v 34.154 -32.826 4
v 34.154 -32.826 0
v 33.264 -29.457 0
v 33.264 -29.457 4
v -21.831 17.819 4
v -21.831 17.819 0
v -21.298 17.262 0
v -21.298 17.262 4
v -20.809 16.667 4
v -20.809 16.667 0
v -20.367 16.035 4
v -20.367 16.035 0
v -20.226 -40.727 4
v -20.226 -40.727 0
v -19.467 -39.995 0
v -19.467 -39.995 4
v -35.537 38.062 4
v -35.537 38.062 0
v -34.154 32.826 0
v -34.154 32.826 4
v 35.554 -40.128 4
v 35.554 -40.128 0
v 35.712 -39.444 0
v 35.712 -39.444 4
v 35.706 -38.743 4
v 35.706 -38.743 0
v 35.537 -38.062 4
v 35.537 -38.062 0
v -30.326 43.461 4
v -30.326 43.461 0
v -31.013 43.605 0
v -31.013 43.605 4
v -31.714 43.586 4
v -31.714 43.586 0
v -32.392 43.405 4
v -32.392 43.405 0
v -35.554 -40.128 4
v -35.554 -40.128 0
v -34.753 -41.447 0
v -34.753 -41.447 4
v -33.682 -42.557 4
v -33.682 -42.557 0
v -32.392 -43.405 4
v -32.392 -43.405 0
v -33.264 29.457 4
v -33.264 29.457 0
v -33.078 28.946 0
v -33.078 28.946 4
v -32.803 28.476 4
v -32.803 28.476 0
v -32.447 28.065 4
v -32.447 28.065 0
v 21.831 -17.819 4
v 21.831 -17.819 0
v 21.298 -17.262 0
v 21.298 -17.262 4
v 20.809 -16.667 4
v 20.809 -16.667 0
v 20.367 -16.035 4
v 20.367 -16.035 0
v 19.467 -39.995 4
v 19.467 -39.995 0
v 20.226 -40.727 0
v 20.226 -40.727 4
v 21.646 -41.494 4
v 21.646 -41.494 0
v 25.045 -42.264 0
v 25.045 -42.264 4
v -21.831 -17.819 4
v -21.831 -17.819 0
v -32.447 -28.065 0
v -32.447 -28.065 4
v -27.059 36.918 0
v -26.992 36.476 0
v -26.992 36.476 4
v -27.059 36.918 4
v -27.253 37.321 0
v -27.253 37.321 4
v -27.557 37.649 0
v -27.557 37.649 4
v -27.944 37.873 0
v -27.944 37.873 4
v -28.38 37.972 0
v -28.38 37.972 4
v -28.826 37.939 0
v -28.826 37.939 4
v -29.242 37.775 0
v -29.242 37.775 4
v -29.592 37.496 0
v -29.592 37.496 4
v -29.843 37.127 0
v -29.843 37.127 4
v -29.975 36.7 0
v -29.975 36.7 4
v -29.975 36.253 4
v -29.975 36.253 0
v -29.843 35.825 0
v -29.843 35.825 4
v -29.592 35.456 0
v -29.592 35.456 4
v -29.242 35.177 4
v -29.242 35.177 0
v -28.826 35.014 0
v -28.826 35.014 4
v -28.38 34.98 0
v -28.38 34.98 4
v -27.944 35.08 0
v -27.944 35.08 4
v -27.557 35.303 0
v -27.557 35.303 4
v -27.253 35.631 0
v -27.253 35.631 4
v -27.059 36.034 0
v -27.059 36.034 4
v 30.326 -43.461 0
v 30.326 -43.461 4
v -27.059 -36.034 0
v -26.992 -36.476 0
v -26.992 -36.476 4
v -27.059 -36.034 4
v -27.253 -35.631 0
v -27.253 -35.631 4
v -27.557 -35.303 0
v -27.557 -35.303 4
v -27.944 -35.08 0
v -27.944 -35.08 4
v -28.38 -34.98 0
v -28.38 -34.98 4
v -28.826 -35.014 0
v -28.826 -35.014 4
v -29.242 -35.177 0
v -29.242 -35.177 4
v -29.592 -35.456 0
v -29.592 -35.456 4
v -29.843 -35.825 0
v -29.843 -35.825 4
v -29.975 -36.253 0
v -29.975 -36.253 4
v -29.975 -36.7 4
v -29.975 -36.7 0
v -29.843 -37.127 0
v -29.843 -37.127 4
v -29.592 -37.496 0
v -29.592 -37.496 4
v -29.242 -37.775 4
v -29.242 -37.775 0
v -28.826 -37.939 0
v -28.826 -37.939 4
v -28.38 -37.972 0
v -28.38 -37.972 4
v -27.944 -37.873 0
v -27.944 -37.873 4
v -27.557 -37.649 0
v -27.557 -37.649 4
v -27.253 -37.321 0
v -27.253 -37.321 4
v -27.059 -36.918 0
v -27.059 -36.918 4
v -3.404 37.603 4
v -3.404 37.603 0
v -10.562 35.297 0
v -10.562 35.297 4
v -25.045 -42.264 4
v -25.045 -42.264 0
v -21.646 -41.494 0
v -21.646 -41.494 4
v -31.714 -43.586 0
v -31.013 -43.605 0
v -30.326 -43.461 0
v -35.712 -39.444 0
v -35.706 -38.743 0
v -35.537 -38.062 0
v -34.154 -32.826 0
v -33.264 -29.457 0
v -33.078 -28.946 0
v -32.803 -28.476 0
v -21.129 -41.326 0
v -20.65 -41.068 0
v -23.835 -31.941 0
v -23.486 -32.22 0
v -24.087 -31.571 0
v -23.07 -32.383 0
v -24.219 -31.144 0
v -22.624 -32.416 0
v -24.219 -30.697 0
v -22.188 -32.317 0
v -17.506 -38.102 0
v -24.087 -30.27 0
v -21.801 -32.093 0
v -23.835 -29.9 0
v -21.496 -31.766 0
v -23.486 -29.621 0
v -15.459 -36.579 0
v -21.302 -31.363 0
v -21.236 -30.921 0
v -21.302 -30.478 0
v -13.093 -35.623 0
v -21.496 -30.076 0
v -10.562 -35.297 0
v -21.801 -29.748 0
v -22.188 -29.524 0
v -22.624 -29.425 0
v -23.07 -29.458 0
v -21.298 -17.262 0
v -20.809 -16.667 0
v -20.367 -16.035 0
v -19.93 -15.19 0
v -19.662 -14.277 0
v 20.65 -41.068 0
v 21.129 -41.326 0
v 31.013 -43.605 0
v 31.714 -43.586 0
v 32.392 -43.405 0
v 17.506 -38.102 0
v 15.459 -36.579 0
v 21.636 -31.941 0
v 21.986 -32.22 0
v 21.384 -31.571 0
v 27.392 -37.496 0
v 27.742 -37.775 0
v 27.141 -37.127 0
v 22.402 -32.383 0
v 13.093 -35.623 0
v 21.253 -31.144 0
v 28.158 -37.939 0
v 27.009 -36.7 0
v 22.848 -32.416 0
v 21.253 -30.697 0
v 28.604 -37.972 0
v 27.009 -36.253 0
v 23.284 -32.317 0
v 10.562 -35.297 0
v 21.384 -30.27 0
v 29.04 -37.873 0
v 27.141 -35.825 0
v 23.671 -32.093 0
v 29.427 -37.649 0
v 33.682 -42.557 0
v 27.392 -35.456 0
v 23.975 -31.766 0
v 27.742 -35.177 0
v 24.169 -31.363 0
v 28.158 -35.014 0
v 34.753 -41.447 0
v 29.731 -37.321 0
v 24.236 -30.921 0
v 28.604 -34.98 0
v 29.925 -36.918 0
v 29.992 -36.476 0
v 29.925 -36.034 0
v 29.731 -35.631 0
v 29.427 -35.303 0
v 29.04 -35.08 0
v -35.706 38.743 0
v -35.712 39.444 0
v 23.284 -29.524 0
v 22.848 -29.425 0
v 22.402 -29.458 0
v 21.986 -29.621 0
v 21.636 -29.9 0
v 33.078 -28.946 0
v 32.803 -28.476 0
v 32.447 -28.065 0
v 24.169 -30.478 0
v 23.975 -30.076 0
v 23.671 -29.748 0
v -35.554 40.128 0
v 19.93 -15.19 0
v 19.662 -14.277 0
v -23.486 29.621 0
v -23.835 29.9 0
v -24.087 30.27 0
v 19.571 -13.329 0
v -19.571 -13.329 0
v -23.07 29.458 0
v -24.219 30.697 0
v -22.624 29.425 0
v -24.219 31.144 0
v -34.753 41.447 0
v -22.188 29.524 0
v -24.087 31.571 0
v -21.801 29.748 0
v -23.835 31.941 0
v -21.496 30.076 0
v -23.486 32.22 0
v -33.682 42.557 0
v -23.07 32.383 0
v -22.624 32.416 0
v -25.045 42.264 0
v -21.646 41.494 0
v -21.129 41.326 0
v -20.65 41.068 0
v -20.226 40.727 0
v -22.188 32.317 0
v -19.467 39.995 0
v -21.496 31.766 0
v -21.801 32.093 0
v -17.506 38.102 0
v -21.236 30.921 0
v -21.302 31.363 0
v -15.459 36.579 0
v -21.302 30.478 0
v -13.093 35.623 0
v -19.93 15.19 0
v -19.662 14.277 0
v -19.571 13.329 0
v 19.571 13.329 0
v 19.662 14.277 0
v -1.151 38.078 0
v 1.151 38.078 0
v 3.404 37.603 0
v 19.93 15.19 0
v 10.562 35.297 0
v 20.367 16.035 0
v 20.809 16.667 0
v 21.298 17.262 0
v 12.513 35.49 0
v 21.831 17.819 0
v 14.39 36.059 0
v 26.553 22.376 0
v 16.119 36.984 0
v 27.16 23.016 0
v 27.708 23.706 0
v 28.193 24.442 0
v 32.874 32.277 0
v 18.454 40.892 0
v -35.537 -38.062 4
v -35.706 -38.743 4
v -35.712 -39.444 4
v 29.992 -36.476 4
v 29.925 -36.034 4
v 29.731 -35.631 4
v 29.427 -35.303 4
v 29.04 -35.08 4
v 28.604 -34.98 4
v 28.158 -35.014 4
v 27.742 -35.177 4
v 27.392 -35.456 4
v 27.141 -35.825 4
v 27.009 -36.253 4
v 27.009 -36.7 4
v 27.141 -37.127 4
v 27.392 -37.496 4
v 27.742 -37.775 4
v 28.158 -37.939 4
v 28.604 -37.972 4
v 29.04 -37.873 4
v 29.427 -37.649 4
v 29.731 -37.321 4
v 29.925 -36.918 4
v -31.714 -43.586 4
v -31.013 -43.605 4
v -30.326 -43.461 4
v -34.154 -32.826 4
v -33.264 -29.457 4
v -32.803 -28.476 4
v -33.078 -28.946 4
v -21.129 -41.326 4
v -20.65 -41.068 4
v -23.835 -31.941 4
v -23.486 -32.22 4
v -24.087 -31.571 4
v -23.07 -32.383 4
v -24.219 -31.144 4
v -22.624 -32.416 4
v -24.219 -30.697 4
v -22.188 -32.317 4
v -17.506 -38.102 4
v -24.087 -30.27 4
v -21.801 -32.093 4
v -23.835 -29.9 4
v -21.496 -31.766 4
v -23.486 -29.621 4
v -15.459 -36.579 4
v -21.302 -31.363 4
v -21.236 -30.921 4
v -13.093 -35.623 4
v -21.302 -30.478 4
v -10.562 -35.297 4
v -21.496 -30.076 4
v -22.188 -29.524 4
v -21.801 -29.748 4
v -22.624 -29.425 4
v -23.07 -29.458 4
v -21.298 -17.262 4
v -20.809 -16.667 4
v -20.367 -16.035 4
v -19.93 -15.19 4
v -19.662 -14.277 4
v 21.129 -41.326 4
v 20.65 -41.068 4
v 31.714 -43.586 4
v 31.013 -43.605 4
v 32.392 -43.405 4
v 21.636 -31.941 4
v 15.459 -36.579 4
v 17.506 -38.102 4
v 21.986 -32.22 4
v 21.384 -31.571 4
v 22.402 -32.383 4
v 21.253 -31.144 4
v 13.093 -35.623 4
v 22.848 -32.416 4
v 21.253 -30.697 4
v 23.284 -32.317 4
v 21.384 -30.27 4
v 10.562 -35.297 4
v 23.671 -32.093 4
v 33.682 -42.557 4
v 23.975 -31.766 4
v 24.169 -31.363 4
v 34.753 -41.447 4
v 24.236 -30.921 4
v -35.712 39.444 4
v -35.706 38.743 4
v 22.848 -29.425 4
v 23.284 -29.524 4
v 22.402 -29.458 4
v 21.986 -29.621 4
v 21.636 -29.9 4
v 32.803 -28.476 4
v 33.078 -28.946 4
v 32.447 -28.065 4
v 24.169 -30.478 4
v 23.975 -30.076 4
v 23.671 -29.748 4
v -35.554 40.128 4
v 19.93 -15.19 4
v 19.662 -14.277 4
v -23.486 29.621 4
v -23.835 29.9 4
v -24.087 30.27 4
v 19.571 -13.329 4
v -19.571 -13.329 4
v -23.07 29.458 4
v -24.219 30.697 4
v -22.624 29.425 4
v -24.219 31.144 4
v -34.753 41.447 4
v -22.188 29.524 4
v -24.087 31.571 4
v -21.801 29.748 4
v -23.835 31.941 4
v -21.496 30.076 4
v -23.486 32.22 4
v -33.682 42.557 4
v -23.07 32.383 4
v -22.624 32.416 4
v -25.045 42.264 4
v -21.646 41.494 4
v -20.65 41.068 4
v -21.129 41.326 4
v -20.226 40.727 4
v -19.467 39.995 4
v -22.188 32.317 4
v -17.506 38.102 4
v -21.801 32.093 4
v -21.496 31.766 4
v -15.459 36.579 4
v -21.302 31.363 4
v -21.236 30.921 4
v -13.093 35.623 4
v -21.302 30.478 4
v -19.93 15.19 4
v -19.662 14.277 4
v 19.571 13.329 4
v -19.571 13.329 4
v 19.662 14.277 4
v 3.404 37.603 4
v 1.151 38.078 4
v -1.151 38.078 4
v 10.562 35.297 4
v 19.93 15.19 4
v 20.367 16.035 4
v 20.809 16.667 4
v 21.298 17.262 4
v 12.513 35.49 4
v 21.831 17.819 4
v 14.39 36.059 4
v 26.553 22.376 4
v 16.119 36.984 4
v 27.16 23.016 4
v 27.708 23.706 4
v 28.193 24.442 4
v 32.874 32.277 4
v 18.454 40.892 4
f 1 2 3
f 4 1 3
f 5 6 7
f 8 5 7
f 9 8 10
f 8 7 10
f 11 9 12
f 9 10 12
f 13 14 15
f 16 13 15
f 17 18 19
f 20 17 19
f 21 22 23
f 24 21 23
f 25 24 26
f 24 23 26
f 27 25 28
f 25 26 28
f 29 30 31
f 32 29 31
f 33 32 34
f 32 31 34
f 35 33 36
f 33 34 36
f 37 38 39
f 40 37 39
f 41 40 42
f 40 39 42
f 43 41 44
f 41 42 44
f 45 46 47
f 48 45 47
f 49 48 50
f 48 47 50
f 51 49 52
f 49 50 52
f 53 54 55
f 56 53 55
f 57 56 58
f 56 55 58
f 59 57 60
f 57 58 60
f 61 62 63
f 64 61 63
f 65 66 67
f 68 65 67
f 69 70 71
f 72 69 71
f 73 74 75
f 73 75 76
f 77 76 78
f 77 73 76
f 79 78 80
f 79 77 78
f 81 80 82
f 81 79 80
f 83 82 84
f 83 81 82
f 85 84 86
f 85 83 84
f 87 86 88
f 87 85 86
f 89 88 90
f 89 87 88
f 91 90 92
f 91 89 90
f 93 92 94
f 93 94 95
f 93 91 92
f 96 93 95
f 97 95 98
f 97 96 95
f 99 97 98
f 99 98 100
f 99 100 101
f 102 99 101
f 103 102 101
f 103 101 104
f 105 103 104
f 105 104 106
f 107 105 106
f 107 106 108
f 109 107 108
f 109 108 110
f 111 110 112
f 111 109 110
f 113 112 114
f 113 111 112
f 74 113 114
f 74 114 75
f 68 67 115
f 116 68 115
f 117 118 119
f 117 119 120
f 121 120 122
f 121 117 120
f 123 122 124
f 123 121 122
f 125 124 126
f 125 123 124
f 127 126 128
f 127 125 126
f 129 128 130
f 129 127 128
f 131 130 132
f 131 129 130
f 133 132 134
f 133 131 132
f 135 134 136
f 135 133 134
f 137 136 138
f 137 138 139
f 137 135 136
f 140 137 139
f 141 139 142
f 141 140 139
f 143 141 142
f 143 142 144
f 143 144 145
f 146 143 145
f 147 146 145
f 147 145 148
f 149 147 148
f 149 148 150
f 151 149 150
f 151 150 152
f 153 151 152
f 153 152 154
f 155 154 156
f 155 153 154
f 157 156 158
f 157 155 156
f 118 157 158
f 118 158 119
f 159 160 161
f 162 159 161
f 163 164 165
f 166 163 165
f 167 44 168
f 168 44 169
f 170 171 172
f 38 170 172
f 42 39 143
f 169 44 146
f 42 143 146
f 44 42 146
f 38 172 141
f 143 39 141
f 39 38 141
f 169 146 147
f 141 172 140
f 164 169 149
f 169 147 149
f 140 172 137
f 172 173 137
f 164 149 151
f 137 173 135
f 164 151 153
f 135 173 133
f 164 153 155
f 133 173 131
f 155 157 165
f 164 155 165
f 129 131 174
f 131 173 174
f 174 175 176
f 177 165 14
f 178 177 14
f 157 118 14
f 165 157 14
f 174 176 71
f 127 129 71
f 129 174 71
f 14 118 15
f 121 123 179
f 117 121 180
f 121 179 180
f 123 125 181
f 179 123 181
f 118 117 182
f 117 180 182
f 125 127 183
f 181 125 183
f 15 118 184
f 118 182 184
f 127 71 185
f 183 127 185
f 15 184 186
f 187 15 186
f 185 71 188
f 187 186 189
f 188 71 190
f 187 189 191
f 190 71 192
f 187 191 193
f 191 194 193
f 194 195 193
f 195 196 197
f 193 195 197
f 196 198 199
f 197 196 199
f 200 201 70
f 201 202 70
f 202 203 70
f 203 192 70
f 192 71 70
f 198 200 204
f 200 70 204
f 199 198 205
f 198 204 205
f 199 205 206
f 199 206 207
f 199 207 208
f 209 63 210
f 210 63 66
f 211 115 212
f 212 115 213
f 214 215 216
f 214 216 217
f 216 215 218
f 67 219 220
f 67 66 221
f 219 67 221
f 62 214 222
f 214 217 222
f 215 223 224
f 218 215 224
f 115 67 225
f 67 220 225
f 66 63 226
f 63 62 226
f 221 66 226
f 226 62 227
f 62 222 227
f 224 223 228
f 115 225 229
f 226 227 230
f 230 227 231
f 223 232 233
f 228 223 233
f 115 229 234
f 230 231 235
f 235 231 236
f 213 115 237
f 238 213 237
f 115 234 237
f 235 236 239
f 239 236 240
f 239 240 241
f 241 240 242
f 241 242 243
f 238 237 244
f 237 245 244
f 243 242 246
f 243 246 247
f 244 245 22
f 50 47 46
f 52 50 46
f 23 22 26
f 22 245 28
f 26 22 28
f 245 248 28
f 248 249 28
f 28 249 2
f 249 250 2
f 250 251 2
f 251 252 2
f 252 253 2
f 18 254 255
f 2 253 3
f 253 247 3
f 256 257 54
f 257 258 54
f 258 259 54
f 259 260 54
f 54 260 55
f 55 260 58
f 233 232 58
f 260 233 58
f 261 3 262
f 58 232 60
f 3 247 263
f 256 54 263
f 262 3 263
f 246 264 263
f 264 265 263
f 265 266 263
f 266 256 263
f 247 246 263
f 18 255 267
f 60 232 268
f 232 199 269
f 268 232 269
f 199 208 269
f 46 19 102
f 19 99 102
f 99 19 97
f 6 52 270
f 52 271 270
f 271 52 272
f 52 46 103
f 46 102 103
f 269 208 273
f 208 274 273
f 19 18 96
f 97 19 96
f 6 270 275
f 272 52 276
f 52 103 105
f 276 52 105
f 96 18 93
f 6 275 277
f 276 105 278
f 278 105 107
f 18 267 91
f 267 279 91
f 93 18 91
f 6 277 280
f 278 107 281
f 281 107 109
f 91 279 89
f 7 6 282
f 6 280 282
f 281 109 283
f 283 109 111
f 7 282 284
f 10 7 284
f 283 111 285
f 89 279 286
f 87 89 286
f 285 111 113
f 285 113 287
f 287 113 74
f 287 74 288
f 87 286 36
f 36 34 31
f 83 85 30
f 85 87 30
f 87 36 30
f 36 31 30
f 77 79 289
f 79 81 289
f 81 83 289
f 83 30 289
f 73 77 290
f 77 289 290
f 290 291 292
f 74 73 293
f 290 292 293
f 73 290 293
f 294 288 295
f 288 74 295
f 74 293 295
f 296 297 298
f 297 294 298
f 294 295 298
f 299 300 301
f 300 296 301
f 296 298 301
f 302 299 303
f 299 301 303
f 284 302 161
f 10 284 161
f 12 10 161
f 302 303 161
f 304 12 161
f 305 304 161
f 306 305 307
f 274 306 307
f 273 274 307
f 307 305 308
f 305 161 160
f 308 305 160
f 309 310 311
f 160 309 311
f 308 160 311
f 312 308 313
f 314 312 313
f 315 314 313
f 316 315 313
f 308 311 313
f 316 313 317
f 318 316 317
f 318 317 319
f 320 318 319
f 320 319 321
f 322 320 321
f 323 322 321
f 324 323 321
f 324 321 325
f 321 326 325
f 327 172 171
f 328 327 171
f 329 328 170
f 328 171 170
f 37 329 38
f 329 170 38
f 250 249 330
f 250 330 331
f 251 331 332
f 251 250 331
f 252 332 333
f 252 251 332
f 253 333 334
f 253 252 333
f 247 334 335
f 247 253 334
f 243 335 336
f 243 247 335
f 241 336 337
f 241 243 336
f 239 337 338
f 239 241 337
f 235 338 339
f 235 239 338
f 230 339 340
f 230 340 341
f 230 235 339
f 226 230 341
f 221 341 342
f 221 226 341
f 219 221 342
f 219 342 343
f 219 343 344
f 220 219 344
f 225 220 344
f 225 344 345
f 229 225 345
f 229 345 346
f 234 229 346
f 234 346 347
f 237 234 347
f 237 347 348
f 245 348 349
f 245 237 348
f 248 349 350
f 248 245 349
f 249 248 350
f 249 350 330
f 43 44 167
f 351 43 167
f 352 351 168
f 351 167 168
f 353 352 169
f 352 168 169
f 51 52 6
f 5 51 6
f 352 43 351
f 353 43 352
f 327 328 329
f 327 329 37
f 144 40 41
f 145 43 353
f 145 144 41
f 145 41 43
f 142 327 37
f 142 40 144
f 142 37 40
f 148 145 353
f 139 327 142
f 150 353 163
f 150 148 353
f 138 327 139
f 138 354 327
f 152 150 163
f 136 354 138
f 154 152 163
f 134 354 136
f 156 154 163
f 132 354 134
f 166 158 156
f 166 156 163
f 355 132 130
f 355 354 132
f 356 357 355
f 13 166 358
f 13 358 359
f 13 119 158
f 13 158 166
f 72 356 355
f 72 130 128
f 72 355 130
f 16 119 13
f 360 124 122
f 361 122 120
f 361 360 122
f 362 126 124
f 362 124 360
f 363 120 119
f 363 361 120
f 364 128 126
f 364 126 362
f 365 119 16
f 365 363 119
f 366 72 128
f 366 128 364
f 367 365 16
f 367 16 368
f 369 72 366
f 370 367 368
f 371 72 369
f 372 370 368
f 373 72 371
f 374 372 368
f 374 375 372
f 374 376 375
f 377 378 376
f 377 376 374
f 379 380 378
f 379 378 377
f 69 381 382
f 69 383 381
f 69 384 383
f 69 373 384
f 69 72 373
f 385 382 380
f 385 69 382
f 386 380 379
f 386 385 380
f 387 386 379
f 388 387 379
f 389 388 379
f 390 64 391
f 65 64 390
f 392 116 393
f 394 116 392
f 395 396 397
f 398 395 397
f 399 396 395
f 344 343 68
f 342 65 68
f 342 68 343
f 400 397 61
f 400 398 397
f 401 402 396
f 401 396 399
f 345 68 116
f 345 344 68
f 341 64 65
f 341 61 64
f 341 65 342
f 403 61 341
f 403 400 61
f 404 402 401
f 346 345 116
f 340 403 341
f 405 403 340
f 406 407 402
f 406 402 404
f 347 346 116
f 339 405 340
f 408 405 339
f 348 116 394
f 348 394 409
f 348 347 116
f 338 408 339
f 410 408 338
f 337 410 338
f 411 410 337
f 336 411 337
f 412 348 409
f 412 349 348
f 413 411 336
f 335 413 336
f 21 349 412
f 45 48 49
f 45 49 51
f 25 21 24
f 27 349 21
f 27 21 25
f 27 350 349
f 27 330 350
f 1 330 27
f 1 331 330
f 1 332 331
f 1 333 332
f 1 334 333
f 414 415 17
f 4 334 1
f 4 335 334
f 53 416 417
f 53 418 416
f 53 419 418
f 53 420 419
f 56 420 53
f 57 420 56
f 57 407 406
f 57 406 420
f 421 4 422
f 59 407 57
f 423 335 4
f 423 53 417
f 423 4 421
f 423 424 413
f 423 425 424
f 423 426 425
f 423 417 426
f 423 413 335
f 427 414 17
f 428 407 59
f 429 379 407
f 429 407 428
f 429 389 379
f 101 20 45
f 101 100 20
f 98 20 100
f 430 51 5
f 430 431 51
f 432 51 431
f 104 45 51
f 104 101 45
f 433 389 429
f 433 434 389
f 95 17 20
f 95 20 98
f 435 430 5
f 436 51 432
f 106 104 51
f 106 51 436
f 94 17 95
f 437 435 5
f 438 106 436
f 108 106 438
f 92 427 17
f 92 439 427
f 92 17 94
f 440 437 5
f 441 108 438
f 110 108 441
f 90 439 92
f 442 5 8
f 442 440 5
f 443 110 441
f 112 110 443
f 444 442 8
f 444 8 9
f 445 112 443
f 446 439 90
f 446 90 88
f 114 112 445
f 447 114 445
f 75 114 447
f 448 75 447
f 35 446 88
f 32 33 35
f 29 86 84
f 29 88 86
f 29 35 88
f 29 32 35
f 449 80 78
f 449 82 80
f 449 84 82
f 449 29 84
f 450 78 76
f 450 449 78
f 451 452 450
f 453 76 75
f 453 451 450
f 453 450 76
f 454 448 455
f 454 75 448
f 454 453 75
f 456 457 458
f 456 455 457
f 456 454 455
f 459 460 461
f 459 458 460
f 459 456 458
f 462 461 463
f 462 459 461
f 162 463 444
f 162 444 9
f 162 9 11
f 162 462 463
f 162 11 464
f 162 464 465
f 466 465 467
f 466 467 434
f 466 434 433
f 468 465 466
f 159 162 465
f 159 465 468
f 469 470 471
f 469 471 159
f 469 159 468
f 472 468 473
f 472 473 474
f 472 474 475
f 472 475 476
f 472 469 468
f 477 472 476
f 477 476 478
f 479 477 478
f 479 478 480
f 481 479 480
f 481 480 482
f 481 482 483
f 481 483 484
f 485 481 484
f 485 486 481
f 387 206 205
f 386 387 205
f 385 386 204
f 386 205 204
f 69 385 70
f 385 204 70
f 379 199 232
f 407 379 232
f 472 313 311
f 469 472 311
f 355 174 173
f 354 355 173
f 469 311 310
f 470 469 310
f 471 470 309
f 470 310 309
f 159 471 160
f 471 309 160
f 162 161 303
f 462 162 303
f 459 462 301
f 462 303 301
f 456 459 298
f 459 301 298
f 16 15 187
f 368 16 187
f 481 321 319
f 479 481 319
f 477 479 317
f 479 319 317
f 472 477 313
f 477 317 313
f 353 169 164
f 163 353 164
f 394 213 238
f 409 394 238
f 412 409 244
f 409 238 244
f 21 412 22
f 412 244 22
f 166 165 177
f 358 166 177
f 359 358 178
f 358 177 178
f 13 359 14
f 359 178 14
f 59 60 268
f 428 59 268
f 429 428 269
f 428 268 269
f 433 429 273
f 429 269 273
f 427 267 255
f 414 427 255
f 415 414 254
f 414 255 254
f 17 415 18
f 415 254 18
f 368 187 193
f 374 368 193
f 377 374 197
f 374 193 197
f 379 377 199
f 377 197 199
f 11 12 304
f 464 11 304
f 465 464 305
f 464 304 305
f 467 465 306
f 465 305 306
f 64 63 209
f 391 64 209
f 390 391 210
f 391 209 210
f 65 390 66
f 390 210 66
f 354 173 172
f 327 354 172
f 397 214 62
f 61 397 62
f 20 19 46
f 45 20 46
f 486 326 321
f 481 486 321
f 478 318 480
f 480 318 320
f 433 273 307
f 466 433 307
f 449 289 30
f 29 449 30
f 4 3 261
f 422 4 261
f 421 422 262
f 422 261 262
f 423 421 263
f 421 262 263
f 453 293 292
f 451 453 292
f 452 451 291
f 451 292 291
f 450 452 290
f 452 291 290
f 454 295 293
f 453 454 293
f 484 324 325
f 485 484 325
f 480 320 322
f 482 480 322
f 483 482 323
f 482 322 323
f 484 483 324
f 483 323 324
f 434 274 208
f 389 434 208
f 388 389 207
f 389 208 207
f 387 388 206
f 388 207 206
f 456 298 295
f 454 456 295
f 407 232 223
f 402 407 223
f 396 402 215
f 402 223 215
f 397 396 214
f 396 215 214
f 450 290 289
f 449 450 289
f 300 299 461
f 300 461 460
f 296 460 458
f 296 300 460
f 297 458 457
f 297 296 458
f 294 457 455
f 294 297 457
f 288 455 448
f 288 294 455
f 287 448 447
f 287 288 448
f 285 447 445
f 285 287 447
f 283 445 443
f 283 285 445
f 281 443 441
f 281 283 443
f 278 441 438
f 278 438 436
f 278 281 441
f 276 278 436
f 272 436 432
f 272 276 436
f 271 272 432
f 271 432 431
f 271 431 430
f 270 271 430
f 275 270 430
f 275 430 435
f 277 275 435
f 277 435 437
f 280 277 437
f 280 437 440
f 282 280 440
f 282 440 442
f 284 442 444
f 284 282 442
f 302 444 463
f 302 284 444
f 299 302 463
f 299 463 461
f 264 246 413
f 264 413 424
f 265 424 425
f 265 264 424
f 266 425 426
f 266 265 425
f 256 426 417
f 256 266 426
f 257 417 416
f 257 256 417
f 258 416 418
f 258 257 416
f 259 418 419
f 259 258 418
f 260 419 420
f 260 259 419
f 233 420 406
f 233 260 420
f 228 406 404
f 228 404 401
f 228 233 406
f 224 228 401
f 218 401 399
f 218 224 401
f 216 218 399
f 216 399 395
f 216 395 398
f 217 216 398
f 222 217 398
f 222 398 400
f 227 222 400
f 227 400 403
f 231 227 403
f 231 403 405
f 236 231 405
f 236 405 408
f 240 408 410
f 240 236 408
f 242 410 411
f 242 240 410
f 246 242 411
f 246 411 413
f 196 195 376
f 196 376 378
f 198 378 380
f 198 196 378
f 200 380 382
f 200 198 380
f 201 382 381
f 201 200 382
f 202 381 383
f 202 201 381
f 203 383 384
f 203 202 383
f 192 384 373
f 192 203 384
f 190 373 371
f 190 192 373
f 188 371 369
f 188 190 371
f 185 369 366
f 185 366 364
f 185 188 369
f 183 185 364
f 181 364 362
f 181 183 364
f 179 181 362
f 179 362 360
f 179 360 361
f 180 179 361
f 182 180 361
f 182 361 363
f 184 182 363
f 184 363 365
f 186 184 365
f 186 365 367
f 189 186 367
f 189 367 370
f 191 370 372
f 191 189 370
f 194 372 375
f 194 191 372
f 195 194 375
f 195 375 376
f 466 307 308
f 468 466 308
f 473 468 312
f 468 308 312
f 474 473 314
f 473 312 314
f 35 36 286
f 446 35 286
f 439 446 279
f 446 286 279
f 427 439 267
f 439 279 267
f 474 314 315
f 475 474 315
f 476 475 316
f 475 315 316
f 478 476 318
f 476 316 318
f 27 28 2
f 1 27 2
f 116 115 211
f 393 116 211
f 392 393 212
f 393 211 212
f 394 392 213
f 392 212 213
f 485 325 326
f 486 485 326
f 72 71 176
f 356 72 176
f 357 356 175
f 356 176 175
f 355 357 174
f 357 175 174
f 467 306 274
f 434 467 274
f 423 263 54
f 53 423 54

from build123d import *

# Parameters (mm, degrees)
F0_R     = 1.5
F1_DEPTH = 4


with BuildPart() as f1:
    # F0 (on Top) → F1 (new body)
    with BuildSketch(Plane.XY):
        with BuildLine():
            ThreePointArc((20.225759, -40.726859), (20.88342, -41.207836), (21.646246, -41.494115))
            Line((21.646246, -41.494115), (25.044904, -42.264138))
            Line((25.044904, -42.264138), (30.325992, -43.460657))
            ThreePointArc((30.325992, -43.460657), (31.363938, -43.61615), (32.391927, -43.404607))
            ThreePointArc((32.391927, -43.404607), (34.248228, -42.031919), (35.554256, -40.128129))
            ThreePointArc((35.554256, -40.128129), (35.729228, -39.093288), (35.537043, -38.061505))
            Line((35.537043, -38.061505), (34.154086, -32.826147))
            Line((34.154086, -32.826147), (33.264079, -29.456918))
            ThreePointArc((33.264079, -29.456918), (32.950942, -28.704719), (32.446956, -28.06452))
            Line((32.446956, -28.06452), (21.831277, -17.818679))
            ThreePointArc((21.831277, -17.818679), (21.047455, -16.969344), (20.366866, -16.035244))
            ThreePointArc((20.366866, -16.035244), (19.774372, -14.739531), (19.571381, -13.329314))
            Line((19.571381, -13.329314), (19.571381, 13.329314))
            ThreePointArc((19.571381, 13.329314), (19.774372, 14.739531), (20.366866, 16.035244))
            ThreePointArc((20.366866, 16.035244), (21.047455, 16.969344), (21.831277, 17.818679))
            Line((21.831277, 17.818679), (26.553101, 22.376))
            ThreePointArc((26.553101, 22.376), (27.441465, 23.354835), (28.192963, 24.442291))
            Line((28.192963, 24.442291), (32.873942, 32.276906))
            Line((32.873942, 32.276906), (18.454344, 40.892242))
            Line((18.454344, 40.892242), (16.119281, 36.984016))
            ThreePointArc((16.119281, 36.984016), (13.46563, 35.728384), (10.561704, 35.29746))
            Line((10.561704, 35.29746), (3.403735, 37.603494))
            ThreePointArc((3.403735, 37.603494), (0, 38.13824), (-3.403735, 37.603494))
            Line((-3.403735, 37.603494), (-10.561704, 35.29746))
            ThreePointArc((-10.561704, 35.29746), (-14.306504, 36.02511), (-17.506323, 38.102165))
            Line((-17.506323, 38.102165), (-19.467341, 39.994863))
            Line((-19.467341, 39.994863), (-20.225759, 40.726859))
            ThreePointArc((-20.225759, 40.726859), (-20.88342, 41.207836), (-21.646246, 41.494115))
            Line((-21.646246, 41.494115), (-25.044904, 42.264138))
            Line((-25.044904, 42.264138), (-30.325992, 43.460657))
            ThreePointArc((-30.325992, 43.460657), (-31.363938, 43.61615), (-32.391927, 43.404607))
            ThreePointArc((-32.391927, 43.404607), (-34.248228, 42.031919), (-35.554256, 40.128129))
            ThreePointArc((-35.554256, 40.128129), (-35.729228, 39.093288), (-35.537043, 38.061505))
            Line((-35.537043, 38.061505), (-34.154086, 32.826147))
            Line((-34.154086, 32.826147), (-33.264079, 29.456918))
            ThreePointArc((-33.264079, 29.456918), (-32.950942, 28.704719), (-32.446956, 28.06452))
            Line((-32.446956, 28.06452), (-21.831277, 17.818679))
            ThreePointArc((-21.831277, 17.818679), (-21.047455, 16.969344), (-20.366866, 16.035244))
            ThreePointArc((-20.366866, 16.035244), (-19.774372, 14.739531), (-19.571381, 13.329314))
            Line((-19.571381, 13.329314), (-19.571381, -13.329314))
            ThreePointArc((-19.571381, -13.329314), (-19.774372, -14.739531), (-20.366866, -16.035244))
            ThreePointArc((-20.366866, -16.035244), (-21.047455, -16.969344), (-21.831277, -17.818679))
            Line((-21.831277, -17.818679), (-32.446956, -28.06452))
            ThreePointArc((-32.446956, -28.06452), (-32.950942, -28.704719), (-33.264079, -29.456918))
            Line((-33.264079, -29.456918), (-34.154086, -32.826147))
            Line((-34.154086, -32.826147), (-35.537043, -38.061505))
            ThreePointArc((-35.537043, -38.061505), (-35.729228, -39.093288), (-35.554256, -40.128129))
            ThreePointArc((-35.554256, -40.128129), (-34.248228, -42.031919), (-32.391927, -43.404607))
            ThreePointArc((-32.391927, -43.404607), (-31.363938, -43.61615), (-30.325992, -43.460657))
            Line((-30.325992, -43.460657), (-25.044904, -42.264138))
            Line((-25.044904, -42.264138), (-21.646246, -41.494115))
            ThreePointArc((-21.646246, -41.494115), (-20.88342, -41.207836), (-20.225759, -40.726859))
            Line((-20.225759, -40.726859), (-19.467341, -39.994863))
            Line((-19.467341, -39.994863), (-17.506323, -38.102165))
            ThreePointArc((-17.506323, -38.102165), (-14.306504, -36.02511), (-10.561704, -35.29746))
            Line((-10.561704, -35.29746), (10.561704, -35.29746))
            ThreePointArc((10.561704, -35.29746), (14.306504, -36.02511), (17.506323, -38.102165))
            Line((17.506323, -38.102165), (19.467341, -39.994863))
            Line((19.467341, -39.994863), (20.225759, -40.726859))
        make_face()
        with Locations((-28.491992, -36.476224)):
            Circle(F0_R, mode=Mode.SUBTRACT)
        with Locations((-22.735756, -30.920528)):
            Circle(F0_R, mode=Mode.SUBTRACT)
        with Locations((28.491992, -36.476224)):
            Circle(F0_R, mode=Mode.SUBTRACT)
        with Locations((22.735756, -30.920528)):
            Circle(F0_R, mode=Mode.SUBTRACT)
        with Locations((-22.735756, 30.920528)):
            Circle(F0_R, mode=Mode.SUBTRACT)
        with Locations((-28.491992, 36.476224)):
            Circle(F0_R, mode=Mode.SUBTRACT)
    extrude(amount=F1_DEPTH)


solid = f1.part
